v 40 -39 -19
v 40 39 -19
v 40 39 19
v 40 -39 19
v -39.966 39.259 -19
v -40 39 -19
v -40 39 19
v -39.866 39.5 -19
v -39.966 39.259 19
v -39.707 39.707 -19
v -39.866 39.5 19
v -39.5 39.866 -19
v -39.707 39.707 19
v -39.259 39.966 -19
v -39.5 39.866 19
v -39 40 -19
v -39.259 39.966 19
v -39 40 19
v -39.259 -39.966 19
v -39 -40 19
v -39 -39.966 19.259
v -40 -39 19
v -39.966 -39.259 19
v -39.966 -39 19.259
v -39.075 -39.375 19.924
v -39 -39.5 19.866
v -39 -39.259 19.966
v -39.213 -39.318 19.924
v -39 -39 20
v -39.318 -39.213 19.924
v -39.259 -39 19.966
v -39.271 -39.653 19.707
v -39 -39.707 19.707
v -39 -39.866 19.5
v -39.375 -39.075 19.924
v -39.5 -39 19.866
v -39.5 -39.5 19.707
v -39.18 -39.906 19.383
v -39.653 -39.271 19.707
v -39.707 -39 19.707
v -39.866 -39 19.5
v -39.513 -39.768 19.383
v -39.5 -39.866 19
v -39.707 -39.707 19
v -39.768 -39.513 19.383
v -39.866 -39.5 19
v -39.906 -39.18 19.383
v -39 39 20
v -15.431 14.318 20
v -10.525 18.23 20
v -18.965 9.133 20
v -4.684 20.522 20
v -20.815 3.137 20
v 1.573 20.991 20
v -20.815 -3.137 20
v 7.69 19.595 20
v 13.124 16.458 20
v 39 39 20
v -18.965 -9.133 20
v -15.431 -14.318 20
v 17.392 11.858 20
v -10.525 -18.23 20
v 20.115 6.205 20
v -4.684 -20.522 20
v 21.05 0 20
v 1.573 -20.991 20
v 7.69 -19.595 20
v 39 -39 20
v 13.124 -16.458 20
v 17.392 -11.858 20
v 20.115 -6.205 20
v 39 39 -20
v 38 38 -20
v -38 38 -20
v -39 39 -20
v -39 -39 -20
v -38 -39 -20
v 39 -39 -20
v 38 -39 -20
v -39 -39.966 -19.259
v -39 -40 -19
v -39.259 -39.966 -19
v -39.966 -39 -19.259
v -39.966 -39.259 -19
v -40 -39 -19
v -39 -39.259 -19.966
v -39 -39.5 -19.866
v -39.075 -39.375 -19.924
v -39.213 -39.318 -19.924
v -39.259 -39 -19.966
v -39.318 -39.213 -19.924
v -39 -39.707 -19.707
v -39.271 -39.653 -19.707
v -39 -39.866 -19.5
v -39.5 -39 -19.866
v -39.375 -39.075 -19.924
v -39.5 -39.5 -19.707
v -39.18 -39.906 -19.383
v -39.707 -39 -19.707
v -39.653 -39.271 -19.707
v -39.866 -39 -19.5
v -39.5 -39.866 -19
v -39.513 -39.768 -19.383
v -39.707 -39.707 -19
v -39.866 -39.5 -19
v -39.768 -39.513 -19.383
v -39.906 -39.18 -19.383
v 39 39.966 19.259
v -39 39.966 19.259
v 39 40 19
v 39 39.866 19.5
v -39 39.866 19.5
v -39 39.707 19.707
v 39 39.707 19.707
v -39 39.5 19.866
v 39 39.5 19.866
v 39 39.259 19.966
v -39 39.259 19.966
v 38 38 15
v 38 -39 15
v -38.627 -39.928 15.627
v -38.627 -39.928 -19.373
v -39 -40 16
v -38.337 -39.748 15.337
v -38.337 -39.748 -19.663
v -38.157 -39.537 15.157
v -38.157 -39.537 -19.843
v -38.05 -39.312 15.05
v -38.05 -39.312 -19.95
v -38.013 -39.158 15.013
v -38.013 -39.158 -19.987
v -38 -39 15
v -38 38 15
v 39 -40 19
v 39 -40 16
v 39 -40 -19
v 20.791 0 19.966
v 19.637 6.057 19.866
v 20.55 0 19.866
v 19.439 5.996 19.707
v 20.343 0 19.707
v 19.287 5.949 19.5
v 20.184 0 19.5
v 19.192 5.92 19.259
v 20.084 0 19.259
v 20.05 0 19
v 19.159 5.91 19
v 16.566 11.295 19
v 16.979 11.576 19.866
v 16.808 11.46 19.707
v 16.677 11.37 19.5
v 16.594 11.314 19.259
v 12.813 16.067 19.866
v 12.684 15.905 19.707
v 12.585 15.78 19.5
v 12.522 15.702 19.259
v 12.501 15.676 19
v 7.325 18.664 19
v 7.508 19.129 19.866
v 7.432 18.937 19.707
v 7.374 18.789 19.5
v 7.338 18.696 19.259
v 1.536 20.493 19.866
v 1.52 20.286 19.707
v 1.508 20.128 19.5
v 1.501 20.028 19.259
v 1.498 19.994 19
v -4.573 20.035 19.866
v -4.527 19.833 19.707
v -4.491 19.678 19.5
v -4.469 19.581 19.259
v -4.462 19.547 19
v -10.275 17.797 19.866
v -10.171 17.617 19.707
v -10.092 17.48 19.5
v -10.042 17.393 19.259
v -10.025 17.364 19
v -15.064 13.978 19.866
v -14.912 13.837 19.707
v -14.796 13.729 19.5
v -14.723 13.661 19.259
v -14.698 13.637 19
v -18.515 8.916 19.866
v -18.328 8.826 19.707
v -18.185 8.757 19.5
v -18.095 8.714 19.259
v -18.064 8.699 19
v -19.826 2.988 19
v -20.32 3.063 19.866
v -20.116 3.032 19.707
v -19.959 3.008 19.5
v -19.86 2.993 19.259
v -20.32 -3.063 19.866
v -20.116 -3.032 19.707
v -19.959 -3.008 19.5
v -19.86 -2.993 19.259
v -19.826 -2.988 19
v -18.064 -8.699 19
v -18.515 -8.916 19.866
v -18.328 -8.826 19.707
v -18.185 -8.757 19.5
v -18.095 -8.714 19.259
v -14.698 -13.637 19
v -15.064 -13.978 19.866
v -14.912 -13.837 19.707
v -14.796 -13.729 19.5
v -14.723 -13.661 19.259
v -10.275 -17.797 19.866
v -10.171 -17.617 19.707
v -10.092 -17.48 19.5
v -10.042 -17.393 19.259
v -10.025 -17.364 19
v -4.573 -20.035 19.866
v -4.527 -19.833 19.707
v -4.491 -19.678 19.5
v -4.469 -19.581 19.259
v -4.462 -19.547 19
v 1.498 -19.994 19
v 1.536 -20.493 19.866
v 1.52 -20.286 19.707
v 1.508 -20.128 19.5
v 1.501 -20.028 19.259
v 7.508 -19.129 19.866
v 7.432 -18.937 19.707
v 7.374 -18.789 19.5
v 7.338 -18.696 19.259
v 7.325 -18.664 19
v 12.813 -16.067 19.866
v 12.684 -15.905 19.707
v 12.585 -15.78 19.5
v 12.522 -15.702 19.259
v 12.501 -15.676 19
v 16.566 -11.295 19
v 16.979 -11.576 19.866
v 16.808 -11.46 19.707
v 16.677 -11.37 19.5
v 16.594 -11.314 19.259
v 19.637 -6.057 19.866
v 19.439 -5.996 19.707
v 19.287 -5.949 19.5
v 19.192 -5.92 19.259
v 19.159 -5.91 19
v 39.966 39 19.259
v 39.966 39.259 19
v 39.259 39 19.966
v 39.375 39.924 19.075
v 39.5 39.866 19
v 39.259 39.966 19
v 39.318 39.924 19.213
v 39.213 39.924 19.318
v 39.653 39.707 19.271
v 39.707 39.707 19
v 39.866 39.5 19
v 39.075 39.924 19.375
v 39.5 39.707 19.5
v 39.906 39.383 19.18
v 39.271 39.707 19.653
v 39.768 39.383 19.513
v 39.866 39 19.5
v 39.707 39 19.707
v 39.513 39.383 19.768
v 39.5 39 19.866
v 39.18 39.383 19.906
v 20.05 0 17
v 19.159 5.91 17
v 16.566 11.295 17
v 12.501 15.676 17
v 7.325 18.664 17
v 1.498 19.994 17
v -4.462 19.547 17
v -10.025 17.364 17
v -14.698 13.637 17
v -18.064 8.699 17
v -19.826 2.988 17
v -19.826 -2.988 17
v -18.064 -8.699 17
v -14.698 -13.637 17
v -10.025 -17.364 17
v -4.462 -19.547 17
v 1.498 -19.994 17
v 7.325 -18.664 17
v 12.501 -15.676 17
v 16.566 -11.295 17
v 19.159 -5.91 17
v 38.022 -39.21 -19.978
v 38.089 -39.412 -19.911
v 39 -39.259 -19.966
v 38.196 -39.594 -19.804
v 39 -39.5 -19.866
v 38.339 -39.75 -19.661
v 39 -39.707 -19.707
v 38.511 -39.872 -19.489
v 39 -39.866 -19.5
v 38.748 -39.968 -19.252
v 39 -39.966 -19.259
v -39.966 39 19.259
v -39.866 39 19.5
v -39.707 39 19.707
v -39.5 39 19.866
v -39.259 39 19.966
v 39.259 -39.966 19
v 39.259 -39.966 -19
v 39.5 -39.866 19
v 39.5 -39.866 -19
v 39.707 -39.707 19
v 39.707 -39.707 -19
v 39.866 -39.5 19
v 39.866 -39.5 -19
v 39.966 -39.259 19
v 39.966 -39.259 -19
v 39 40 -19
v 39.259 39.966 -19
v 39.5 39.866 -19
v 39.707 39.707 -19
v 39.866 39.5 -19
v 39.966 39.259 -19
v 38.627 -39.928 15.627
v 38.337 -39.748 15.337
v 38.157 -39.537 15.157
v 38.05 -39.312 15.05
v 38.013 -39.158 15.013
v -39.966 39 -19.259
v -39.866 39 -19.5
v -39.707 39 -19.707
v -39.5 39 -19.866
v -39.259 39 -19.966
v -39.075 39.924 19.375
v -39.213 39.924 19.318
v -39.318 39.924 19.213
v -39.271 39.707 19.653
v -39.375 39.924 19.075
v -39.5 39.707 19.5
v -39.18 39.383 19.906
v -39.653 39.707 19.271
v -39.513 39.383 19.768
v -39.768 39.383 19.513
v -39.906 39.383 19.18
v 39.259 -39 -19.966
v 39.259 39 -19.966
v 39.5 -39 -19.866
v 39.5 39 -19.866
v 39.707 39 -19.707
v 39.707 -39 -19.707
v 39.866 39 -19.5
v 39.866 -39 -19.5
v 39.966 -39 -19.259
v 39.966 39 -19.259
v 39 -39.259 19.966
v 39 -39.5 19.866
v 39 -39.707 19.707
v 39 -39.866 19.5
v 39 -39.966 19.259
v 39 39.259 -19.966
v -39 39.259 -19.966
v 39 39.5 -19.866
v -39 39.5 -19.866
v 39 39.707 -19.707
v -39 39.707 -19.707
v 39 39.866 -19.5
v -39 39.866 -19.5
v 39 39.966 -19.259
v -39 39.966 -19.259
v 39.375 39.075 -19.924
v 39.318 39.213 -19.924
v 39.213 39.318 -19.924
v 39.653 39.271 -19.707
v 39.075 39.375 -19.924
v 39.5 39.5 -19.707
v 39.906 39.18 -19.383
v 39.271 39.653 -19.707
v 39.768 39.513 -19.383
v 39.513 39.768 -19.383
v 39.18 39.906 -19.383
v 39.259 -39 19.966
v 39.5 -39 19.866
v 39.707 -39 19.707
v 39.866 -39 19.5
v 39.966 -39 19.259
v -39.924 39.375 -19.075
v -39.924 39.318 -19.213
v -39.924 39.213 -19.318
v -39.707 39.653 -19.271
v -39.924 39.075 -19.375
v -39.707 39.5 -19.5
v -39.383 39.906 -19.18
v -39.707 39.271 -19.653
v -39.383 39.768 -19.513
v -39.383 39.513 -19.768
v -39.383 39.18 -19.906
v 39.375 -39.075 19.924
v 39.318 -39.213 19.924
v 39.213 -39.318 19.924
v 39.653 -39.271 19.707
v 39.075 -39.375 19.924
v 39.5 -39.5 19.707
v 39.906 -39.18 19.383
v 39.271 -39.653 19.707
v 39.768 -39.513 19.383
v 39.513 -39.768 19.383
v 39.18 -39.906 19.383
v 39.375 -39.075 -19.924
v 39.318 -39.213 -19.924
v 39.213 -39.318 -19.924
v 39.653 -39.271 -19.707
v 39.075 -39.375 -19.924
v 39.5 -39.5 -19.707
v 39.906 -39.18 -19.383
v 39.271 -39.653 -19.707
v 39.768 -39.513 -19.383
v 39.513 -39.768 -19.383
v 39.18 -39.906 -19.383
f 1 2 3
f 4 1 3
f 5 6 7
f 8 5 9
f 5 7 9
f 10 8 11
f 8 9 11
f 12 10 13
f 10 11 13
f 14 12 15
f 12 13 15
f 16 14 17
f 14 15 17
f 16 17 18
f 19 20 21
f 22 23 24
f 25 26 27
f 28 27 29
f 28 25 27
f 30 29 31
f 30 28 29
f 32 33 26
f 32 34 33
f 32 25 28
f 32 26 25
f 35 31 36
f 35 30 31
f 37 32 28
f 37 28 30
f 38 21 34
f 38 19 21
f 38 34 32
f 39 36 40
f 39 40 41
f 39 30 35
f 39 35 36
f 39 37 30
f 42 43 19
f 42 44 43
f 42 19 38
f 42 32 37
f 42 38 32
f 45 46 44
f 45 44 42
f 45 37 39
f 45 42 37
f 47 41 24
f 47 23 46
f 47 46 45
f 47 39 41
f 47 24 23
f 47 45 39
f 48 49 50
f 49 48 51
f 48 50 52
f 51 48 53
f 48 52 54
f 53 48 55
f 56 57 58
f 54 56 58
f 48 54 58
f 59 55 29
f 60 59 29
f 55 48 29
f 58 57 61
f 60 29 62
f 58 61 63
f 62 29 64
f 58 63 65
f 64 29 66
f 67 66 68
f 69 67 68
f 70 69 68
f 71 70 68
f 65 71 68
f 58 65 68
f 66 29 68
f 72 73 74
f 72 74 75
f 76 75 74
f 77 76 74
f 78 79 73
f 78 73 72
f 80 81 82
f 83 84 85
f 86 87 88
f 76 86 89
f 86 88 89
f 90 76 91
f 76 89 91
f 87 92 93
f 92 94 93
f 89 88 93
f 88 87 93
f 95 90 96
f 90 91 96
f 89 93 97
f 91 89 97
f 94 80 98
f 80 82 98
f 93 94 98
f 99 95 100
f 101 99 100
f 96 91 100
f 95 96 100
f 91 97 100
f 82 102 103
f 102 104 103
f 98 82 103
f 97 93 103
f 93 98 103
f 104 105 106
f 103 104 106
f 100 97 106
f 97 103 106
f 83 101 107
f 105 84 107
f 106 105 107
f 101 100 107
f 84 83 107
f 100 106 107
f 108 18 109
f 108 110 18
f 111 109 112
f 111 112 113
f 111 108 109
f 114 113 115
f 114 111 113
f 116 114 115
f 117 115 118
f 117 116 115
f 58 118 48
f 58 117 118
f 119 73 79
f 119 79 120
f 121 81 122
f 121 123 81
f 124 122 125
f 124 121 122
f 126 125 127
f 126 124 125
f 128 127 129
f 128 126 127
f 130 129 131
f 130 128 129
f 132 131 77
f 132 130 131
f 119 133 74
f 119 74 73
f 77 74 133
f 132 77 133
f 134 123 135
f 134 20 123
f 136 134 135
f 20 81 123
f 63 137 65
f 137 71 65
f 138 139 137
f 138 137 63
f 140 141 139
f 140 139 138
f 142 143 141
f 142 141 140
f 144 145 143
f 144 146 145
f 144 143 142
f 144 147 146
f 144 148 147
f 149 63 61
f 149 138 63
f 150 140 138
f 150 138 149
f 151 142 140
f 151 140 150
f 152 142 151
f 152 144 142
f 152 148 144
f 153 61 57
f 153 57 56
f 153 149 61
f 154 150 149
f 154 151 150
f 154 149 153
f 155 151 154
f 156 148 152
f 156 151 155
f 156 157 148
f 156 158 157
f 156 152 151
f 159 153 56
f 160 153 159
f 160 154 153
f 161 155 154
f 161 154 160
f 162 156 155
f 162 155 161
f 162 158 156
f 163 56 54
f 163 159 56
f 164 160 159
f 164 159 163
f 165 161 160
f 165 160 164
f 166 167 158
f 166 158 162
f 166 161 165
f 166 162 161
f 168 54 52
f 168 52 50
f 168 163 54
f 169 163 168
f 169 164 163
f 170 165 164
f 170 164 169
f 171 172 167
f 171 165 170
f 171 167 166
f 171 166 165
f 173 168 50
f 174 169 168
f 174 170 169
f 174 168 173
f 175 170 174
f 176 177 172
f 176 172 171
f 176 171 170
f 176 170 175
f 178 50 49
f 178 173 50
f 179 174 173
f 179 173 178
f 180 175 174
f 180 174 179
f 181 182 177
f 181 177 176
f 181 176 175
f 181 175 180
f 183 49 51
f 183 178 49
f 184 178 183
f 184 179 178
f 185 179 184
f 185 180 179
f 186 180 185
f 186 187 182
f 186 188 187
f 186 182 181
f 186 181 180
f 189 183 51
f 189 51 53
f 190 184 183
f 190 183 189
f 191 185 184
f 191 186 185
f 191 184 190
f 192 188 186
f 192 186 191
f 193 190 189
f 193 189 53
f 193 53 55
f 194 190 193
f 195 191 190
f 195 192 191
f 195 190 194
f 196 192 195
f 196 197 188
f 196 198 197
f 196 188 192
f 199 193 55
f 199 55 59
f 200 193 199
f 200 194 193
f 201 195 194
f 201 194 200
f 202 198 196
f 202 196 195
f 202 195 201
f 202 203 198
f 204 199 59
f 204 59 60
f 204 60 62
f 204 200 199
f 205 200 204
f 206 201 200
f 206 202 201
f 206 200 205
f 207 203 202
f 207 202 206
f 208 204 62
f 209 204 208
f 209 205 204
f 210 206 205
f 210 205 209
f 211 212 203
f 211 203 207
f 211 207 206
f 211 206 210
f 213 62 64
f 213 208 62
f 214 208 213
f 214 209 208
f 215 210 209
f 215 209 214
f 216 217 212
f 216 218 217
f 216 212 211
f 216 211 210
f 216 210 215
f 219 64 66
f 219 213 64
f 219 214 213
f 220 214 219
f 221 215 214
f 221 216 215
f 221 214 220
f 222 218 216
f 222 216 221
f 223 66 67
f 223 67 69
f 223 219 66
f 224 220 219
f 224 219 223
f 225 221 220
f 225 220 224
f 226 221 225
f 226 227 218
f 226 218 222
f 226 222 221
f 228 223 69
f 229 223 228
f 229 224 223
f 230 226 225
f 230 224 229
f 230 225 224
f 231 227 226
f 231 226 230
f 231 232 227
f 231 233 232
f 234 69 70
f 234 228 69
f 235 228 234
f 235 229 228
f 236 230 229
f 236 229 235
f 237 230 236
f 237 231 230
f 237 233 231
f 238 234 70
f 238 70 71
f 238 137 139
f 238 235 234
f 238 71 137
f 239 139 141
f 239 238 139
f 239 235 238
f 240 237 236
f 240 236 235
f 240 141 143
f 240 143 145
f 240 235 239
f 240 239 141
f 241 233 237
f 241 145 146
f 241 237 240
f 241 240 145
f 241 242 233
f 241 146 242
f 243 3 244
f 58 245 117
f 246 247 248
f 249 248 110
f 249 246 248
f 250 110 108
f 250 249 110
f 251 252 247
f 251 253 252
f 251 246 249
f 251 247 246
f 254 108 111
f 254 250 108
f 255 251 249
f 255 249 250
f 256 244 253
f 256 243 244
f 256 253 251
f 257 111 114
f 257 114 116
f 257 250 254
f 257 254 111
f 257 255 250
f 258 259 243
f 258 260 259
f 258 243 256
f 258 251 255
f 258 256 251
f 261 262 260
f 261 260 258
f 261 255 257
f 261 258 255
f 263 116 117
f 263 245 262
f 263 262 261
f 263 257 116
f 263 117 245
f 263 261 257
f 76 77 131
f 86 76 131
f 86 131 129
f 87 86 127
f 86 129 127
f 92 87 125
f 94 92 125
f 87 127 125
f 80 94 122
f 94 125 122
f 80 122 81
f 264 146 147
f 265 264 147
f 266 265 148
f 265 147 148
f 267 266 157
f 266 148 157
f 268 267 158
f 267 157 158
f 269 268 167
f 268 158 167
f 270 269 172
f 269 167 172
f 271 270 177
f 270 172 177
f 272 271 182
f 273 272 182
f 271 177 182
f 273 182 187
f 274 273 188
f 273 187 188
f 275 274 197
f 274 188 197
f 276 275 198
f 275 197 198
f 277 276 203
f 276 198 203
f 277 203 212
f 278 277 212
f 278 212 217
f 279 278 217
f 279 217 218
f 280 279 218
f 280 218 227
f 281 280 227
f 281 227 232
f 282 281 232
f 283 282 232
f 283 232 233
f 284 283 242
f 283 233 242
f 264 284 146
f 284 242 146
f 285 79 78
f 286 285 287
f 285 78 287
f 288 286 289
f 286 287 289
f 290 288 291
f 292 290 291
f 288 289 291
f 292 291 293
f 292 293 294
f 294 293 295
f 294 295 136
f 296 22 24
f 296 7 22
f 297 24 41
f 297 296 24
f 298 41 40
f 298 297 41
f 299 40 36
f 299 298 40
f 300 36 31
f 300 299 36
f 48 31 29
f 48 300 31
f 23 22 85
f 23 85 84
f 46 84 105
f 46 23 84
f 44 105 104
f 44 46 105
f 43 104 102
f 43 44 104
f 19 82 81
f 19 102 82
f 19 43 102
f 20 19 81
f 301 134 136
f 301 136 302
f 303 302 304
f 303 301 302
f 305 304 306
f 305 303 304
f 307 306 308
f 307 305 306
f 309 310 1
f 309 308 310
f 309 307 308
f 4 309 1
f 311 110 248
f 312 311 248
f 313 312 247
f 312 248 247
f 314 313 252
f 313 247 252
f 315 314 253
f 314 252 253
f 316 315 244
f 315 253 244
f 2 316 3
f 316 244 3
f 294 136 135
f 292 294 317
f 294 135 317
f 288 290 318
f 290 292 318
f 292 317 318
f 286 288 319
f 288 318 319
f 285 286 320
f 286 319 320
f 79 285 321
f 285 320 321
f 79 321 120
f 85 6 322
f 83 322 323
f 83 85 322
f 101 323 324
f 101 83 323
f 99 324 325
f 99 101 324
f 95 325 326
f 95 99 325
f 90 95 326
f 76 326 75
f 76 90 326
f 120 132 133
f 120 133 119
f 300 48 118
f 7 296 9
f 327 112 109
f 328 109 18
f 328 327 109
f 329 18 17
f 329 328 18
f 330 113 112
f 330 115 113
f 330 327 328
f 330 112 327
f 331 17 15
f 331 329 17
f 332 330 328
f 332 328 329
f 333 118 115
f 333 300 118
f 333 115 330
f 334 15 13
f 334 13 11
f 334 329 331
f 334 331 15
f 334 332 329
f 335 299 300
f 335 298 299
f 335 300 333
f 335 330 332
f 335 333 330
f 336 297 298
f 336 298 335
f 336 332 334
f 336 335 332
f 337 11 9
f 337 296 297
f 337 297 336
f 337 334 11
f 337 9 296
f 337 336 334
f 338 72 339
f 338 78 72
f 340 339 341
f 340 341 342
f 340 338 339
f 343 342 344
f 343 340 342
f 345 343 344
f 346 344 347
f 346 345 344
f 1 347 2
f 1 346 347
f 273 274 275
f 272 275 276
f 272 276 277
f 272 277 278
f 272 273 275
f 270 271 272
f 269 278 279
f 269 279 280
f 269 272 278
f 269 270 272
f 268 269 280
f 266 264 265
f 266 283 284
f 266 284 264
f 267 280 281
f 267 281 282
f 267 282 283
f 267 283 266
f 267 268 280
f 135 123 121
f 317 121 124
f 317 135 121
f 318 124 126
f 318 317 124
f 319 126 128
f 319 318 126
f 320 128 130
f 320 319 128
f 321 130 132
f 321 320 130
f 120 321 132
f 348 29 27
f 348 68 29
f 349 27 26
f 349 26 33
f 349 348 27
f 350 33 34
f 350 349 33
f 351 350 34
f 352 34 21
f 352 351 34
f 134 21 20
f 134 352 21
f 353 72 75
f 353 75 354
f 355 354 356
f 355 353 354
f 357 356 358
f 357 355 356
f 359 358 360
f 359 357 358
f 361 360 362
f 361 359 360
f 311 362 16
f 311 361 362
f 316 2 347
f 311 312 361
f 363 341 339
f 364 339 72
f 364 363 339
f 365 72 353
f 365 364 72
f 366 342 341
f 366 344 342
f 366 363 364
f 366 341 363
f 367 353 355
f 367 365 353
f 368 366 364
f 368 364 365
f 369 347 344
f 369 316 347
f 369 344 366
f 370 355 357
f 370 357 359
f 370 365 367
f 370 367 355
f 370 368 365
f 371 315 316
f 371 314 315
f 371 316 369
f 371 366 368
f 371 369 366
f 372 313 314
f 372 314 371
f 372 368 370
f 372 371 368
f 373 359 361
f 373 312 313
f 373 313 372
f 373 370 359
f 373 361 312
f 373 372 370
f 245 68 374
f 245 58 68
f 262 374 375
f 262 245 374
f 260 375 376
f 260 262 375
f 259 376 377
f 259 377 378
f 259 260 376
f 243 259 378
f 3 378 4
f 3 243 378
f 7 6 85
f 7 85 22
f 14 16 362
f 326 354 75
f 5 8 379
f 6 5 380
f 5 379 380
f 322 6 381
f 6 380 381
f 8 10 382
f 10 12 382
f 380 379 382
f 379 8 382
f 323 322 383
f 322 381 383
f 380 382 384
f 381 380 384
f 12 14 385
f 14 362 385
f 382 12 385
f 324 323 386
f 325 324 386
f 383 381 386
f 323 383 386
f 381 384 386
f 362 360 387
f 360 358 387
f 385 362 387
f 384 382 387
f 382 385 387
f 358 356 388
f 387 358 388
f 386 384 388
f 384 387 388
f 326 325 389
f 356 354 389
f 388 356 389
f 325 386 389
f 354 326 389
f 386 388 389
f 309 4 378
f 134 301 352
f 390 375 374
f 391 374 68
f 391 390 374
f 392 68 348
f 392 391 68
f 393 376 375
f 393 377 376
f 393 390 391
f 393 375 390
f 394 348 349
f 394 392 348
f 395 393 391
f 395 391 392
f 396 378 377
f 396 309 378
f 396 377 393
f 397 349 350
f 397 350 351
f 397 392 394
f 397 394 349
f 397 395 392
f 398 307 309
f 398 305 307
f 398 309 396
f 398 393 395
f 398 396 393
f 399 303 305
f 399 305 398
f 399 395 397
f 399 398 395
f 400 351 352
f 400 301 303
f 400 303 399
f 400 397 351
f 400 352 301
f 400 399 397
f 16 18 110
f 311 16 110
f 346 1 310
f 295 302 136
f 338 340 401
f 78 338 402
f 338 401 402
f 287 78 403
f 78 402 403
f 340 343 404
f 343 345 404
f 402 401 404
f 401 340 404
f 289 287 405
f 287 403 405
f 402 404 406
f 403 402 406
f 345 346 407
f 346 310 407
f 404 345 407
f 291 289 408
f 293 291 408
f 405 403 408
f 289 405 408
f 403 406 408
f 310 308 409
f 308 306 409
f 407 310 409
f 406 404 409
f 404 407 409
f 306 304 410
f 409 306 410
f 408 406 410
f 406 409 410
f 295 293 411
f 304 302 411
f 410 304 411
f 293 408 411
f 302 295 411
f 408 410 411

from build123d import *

# Parameters (mm, degrees)
F0_W          = 80
F0_H          = 40
F1_DEPTH      = 40
F1_DEPTH_BACK = 40
F2_W          = 76
F2_H          = 35
F3_DEPTH      = 78
F4_R          = 20.05
F5_DEPTH      = 3
F6_R          = 0.99999


# Not quite as in the source:
# - a fillet or chamfer is up to 0.001 mm smaller than in the source, because OpenCascade refuses the exact size


with BuildPart() as f1:
    # F0 (on Front) → F1 (new body, two sides)
    with BuildSketch(Plane.XZ) as f1_sk:
        Rectangle(F0_W, F0_H)
    extrude(amount=F1_DEPTH)
    extrude(f1_sk.sketch, amount=-F1_DEPTH_BACK)

    # F2 (on face) → F3 (cut)
    with BuildSketch(Plane.XZ.offset(40)):
        with Locations((0, -2.5)):
            Rectangle(F2_W, F2_H)
    extrude(amount=-F3_DEPTH, mode=Mode.SUBTRACT)

    # F4 (on face) → F5 (cut)
    with BuildSketch(Plane.XY.offset(20)):
        Circle(F4_R)
    extrude(amount=-F5_DEPTH, mode=Mode.SUBTRACT)

    # F6 (radius 1 in the source; OpenCascade refuses exactly that, so slightly less here)
    f6_edges = [f1.edges().sort_by_distance(p)[0] for p in [
        (40, -40, 0),
        (40, 0, 20),
        (40, 40, 0),
        (40, 0, -20),
        (-40, -40, 0),
        (0, -40, 20),
        (39, -40, -20),
        (38, -40, -2.5),
        (0, -40, 15),
        (-38, -40, -2.5),
        (-39, -40, -20),
        (-40, 0, 20),
        (0, 40, 20),
        (-20.05, 0, 20),
        (0, 40, -20),
        (-40, 40, 0),
        (-40, 0, -20),
    ]]
    fillet(f6_edges, radius=F6_R)


solid = f1.part
